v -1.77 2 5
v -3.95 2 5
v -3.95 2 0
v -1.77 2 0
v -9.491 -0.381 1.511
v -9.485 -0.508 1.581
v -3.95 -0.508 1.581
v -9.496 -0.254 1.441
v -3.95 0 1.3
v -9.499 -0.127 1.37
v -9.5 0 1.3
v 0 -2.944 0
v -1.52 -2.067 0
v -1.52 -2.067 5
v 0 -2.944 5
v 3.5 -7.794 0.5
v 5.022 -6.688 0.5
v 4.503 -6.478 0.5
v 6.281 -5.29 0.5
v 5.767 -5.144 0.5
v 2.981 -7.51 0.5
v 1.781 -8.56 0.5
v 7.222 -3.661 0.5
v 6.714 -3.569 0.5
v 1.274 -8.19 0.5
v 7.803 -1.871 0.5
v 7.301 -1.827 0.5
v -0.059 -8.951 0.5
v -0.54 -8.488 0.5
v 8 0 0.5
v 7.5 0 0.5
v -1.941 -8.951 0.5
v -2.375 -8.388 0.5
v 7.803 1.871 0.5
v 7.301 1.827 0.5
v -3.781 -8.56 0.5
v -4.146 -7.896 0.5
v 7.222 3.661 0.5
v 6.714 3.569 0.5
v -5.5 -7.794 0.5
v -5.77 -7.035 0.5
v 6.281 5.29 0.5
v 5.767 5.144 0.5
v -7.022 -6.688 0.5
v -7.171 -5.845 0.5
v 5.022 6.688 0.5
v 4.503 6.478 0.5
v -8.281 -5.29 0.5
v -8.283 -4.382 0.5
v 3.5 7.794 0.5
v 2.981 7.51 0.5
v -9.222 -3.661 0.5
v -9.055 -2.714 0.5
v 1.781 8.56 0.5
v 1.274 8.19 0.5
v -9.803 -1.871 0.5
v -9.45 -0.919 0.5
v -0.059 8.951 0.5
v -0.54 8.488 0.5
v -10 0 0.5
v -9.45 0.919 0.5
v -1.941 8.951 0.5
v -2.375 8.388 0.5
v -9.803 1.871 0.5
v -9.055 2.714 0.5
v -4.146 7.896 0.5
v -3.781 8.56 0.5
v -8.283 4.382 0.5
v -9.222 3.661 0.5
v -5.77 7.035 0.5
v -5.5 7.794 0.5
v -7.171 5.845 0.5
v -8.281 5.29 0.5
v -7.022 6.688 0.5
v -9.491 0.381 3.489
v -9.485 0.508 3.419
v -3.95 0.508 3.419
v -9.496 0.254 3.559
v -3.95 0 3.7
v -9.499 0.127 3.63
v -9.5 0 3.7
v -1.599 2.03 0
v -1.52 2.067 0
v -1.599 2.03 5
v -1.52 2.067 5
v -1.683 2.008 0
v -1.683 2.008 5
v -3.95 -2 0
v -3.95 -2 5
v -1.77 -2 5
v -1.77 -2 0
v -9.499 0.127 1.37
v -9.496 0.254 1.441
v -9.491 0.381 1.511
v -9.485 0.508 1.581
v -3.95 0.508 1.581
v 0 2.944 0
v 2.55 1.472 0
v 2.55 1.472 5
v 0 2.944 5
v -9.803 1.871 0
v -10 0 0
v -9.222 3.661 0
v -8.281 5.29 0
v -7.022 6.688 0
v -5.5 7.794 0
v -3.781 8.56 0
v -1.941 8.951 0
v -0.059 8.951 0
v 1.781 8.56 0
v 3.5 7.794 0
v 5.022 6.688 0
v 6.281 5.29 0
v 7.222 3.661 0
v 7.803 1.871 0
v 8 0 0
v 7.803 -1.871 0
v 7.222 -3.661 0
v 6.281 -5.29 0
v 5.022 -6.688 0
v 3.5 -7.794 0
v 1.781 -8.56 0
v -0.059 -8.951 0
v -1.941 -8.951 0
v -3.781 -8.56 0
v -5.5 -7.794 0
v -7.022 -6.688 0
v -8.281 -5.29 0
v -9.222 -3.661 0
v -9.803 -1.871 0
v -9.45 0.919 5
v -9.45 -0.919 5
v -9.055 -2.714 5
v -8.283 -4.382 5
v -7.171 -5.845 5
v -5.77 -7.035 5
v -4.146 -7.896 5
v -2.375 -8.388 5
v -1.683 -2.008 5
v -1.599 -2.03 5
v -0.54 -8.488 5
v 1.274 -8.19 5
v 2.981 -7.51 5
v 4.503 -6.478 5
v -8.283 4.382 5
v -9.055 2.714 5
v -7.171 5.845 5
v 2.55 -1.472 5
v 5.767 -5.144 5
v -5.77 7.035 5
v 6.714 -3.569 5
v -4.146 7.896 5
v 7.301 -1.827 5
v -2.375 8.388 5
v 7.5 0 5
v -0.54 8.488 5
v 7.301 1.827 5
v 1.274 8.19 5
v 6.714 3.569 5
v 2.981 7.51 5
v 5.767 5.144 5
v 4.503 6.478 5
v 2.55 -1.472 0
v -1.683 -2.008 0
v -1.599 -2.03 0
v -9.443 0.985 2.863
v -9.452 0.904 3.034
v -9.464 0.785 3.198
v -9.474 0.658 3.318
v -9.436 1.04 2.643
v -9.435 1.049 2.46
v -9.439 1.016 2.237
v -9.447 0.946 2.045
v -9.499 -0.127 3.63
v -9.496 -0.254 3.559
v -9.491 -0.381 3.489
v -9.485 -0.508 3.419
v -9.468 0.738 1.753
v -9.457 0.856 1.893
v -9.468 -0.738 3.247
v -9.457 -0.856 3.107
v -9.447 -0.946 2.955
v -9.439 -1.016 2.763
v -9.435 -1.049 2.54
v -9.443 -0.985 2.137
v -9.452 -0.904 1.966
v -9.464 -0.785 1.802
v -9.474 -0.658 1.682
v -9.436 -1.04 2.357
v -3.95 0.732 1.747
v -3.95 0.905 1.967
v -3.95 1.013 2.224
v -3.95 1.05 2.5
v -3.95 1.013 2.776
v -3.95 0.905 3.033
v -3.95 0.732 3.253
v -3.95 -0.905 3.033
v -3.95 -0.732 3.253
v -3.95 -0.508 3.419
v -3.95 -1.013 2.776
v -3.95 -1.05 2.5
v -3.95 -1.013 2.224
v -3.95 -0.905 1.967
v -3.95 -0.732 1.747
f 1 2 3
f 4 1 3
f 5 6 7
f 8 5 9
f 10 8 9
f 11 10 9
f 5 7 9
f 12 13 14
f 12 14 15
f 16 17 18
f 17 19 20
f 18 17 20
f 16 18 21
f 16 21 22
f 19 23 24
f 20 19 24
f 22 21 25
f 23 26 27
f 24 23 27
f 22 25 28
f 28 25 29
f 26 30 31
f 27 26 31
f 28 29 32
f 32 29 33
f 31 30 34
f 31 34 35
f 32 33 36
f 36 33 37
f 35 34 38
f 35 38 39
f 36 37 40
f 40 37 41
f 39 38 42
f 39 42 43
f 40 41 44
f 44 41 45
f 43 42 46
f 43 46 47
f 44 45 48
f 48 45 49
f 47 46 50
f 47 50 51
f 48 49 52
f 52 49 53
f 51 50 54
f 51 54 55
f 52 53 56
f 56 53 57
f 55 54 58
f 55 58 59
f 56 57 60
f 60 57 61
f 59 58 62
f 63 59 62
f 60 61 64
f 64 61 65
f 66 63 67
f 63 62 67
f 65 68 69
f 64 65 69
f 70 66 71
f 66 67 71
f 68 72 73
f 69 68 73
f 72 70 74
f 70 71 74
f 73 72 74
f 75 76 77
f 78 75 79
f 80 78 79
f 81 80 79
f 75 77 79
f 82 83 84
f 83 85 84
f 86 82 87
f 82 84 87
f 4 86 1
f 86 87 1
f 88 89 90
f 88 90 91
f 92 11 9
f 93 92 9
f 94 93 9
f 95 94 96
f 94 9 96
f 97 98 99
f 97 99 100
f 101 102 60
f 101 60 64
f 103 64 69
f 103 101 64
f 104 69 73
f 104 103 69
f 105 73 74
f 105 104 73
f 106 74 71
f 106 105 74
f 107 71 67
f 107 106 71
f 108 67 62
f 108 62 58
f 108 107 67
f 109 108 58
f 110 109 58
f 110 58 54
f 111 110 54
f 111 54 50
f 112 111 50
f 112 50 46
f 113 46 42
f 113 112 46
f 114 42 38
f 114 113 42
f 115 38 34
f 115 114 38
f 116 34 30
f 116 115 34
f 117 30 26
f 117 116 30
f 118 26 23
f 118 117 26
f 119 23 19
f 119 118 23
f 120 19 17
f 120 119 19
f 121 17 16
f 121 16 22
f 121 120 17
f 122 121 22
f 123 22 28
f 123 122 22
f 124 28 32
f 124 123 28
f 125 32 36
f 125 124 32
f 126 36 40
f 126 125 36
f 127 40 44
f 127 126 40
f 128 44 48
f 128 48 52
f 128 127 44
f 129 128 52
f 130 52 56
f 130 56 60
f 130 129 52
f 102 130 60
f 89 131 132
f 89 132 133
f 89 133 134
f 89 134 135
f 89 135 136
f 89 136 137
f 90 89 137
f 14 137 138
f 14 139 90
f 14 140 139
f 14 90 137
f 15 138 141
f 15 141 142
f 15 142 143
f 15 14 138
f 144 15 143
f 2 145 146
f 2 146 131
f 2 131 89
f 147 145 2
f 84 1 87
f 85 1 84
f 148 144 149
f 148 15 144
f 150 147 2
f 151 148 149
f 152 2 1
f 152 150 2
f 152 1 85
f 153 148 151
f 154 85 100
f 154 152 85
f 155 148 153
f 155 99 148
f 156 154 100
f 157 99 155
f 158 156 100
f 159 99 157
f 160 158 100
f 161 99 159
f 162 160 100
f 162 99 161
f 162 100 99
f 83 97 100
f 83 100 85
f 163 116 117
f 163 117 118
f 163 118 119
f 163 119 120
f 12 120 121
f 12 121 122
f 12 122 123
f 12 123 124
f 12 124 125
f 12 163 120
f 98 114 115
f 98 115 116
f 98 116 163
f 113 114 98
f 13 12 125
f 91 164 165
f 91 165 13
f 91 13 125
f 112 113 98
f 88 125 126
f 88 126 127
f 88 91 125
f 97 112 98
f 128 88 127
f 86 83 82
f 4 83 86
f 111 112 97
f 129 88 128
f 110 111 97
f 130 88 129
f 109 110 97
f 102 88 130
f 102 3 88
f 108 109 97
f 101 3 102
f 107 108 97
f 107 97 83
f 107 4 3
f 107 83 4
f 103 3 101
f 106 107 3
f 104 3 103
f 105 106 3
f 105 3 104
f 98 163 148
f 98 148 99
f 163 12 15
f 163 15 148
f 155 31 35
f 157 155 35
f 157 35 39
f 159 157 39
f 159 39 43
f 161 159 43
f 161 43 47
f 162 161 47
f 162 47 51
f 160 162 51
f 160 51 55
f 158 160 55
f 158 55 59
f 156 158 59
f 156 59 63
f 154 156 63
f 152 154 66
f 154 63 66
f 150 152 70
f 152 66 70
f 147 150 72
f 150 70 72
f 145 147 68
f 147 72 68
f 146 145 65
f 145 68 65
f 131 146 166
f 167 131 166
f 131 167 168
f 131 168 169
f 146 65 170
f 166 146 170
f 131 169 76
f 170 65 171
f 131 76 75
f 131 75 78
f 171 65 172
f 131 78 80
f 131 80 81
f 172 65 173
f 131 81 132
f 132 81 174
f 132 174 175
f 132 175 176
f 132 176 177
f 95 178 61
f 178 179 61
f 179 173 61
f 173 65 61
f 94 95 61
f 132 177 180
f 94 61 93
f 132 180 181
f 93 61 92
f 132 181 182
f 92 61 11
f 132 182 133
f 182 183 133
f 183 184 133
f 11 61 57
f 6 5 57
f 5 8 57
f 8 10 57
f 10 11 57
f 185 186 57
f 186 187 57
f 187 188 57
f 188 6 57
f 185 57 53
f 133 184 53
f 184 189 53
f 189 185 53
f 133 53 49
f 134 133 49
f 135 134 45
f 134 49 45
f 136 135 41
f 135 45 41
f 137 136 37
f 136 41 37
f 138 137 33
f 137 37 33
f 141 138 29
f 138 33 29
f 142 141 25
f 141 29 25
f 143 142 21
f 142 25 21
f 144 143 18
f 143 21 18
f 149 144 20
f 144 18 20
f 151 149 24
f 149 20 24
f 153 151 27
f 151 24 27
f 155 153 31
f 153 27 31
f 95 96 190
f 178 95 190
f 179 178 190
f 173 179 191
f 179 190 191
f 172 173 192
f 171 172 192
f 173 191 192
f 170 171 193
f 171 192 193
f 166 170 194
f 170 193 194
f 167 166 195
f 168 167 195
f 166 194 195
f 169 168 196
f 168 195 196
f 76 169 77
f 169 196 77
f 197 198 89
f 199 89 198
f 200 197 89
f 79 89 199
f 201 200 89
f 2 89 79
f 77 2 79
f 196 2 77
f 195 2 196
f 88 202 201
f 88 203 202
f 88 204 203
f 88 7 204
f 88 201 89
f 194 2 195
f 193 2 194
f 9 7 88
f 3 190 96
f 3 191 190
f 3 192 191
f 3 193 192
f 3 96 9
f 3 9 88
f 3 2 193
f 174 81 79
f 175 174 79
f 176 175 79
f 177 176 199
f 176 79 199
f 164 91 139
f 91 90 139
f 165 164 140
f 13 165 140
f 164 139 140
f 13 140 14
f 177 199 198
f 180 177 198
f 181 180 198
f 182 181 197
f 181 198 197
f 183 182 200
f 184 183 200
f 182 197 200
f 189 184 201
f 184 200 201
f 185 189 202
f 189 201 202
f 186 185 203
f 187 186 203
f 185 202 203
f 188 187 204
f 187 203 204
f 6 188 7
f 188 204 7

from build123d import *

# Parameters (mm, degrees)
SKETCH1_R                   = 8.5
BOSS_EXTRUDE1_DEPTH         = 5
M2_HEXNUT_CUTOUT_DEPTH      = 1.4
M2_HEXNUT_CUTOUT_DEPTH_BACK = 1.4
SKETCH2_W                   = 5
SKETCH2_H                   = 4
FILLET1_R                   = 0.5
M2_THRU_DEPTH               = 16.111336804
SKETCH4_R                   = 9
SKETCH4_R_2                 = 8.5
BOSS_EXTRUDE2_DEPTH         = 0.5


with BuildPart() as part:
    # Sketch1 → Boss-Extrude1 (new body)
    with BuildSketch(Plane.XY):
        with Locations((-1, 0)):
            Circle(SKETCH1_R)
        Polygon((0, -2.944486373), (2.55, -1.472243186), (2.55, 1.472243186), (0, 2.944486373), (-2.55, 1.472243186), (-2.55, -1.472243186), align=None, mode=Mode.SUBTRACT)
    extrude(amount=BOSS_EXTRUDE1_DEPTH)

    # Sketch2 → M2 Hexnut Cutout (cut, two sides: drawn at the far end of the back side and taken through both)
    with BuildSketch(Plane(origin=(-2.55, 0, 0), x_dir=(0, 0, -1), z_dir=(1, 0, 0)).offset(-M2_HEXNUT_CUTOUT_DEPTH_BACK)):
        with Locations((-2.5, 0)):
            Rectangle(SKETCH2_W, SKETCH2_H)
    extrude(amount=M2_HEXNUT_CUTOUT_DEPTH + M2_HEXNUT_CUTOUT_DEPTH_BACK, mode=Mode.SUBTRACT)

    # Fillet1
    fillet1_edges = [part.edges().sort_by_distance(p)[0] for p in [
        (-1.635898385, 2, 2.5),
        (-1.635898385, -2, 2.5),
    ]]
    fillet(fillet1_edges, radius=FILLET1_R)

    # Sketch3 → M2 Thru (cut, through all)
    with BuildSketch(Plane(origin=(-3.95, 0, 0), x_dir=(0, 0, -1), z_dir=(1, 0, 0))):
        with BuildLine():
            Line((-3.7, 0), (-3.41875, -0.508329064))
            ThreePointArc((-3.41875, -0.508329064), (-2.5, -1.05), (-1.58125, -0.508329064))
            Line((-1.58125, -0.508329064), (-1.3, 0))
            Line((-1.3, 0), (-1.58125, 0.508329064))
            ThreePointArc((-1.58125, 0.508329064), (-2.5, 1.05), (-3.41875, 0.508329064))
            Line((-3.41875, 0.508329064), (-3.7, 0))
        make_face()
    extrude(amount=-M2_THRU_DEPTH, mode=Mode.SUBTRACT)

    # Sketch4 → Boss-Extrude2 (add)
    with BuildSketch(Plane(origin=(0, 0, 0), x_dir=(-1, 0, 0), z_dir=(0, 0, -1))):
        with Locations((1, 0)):
            Circle(SKETCH4_R)
        with Locations((1, 0)):
            Circle(SKETCH4_R_2, mode=Mode.SUBTRACT)
    extrude(amount=-BOSS_EXTRUDE2_DEPTH)


solid = part.part
